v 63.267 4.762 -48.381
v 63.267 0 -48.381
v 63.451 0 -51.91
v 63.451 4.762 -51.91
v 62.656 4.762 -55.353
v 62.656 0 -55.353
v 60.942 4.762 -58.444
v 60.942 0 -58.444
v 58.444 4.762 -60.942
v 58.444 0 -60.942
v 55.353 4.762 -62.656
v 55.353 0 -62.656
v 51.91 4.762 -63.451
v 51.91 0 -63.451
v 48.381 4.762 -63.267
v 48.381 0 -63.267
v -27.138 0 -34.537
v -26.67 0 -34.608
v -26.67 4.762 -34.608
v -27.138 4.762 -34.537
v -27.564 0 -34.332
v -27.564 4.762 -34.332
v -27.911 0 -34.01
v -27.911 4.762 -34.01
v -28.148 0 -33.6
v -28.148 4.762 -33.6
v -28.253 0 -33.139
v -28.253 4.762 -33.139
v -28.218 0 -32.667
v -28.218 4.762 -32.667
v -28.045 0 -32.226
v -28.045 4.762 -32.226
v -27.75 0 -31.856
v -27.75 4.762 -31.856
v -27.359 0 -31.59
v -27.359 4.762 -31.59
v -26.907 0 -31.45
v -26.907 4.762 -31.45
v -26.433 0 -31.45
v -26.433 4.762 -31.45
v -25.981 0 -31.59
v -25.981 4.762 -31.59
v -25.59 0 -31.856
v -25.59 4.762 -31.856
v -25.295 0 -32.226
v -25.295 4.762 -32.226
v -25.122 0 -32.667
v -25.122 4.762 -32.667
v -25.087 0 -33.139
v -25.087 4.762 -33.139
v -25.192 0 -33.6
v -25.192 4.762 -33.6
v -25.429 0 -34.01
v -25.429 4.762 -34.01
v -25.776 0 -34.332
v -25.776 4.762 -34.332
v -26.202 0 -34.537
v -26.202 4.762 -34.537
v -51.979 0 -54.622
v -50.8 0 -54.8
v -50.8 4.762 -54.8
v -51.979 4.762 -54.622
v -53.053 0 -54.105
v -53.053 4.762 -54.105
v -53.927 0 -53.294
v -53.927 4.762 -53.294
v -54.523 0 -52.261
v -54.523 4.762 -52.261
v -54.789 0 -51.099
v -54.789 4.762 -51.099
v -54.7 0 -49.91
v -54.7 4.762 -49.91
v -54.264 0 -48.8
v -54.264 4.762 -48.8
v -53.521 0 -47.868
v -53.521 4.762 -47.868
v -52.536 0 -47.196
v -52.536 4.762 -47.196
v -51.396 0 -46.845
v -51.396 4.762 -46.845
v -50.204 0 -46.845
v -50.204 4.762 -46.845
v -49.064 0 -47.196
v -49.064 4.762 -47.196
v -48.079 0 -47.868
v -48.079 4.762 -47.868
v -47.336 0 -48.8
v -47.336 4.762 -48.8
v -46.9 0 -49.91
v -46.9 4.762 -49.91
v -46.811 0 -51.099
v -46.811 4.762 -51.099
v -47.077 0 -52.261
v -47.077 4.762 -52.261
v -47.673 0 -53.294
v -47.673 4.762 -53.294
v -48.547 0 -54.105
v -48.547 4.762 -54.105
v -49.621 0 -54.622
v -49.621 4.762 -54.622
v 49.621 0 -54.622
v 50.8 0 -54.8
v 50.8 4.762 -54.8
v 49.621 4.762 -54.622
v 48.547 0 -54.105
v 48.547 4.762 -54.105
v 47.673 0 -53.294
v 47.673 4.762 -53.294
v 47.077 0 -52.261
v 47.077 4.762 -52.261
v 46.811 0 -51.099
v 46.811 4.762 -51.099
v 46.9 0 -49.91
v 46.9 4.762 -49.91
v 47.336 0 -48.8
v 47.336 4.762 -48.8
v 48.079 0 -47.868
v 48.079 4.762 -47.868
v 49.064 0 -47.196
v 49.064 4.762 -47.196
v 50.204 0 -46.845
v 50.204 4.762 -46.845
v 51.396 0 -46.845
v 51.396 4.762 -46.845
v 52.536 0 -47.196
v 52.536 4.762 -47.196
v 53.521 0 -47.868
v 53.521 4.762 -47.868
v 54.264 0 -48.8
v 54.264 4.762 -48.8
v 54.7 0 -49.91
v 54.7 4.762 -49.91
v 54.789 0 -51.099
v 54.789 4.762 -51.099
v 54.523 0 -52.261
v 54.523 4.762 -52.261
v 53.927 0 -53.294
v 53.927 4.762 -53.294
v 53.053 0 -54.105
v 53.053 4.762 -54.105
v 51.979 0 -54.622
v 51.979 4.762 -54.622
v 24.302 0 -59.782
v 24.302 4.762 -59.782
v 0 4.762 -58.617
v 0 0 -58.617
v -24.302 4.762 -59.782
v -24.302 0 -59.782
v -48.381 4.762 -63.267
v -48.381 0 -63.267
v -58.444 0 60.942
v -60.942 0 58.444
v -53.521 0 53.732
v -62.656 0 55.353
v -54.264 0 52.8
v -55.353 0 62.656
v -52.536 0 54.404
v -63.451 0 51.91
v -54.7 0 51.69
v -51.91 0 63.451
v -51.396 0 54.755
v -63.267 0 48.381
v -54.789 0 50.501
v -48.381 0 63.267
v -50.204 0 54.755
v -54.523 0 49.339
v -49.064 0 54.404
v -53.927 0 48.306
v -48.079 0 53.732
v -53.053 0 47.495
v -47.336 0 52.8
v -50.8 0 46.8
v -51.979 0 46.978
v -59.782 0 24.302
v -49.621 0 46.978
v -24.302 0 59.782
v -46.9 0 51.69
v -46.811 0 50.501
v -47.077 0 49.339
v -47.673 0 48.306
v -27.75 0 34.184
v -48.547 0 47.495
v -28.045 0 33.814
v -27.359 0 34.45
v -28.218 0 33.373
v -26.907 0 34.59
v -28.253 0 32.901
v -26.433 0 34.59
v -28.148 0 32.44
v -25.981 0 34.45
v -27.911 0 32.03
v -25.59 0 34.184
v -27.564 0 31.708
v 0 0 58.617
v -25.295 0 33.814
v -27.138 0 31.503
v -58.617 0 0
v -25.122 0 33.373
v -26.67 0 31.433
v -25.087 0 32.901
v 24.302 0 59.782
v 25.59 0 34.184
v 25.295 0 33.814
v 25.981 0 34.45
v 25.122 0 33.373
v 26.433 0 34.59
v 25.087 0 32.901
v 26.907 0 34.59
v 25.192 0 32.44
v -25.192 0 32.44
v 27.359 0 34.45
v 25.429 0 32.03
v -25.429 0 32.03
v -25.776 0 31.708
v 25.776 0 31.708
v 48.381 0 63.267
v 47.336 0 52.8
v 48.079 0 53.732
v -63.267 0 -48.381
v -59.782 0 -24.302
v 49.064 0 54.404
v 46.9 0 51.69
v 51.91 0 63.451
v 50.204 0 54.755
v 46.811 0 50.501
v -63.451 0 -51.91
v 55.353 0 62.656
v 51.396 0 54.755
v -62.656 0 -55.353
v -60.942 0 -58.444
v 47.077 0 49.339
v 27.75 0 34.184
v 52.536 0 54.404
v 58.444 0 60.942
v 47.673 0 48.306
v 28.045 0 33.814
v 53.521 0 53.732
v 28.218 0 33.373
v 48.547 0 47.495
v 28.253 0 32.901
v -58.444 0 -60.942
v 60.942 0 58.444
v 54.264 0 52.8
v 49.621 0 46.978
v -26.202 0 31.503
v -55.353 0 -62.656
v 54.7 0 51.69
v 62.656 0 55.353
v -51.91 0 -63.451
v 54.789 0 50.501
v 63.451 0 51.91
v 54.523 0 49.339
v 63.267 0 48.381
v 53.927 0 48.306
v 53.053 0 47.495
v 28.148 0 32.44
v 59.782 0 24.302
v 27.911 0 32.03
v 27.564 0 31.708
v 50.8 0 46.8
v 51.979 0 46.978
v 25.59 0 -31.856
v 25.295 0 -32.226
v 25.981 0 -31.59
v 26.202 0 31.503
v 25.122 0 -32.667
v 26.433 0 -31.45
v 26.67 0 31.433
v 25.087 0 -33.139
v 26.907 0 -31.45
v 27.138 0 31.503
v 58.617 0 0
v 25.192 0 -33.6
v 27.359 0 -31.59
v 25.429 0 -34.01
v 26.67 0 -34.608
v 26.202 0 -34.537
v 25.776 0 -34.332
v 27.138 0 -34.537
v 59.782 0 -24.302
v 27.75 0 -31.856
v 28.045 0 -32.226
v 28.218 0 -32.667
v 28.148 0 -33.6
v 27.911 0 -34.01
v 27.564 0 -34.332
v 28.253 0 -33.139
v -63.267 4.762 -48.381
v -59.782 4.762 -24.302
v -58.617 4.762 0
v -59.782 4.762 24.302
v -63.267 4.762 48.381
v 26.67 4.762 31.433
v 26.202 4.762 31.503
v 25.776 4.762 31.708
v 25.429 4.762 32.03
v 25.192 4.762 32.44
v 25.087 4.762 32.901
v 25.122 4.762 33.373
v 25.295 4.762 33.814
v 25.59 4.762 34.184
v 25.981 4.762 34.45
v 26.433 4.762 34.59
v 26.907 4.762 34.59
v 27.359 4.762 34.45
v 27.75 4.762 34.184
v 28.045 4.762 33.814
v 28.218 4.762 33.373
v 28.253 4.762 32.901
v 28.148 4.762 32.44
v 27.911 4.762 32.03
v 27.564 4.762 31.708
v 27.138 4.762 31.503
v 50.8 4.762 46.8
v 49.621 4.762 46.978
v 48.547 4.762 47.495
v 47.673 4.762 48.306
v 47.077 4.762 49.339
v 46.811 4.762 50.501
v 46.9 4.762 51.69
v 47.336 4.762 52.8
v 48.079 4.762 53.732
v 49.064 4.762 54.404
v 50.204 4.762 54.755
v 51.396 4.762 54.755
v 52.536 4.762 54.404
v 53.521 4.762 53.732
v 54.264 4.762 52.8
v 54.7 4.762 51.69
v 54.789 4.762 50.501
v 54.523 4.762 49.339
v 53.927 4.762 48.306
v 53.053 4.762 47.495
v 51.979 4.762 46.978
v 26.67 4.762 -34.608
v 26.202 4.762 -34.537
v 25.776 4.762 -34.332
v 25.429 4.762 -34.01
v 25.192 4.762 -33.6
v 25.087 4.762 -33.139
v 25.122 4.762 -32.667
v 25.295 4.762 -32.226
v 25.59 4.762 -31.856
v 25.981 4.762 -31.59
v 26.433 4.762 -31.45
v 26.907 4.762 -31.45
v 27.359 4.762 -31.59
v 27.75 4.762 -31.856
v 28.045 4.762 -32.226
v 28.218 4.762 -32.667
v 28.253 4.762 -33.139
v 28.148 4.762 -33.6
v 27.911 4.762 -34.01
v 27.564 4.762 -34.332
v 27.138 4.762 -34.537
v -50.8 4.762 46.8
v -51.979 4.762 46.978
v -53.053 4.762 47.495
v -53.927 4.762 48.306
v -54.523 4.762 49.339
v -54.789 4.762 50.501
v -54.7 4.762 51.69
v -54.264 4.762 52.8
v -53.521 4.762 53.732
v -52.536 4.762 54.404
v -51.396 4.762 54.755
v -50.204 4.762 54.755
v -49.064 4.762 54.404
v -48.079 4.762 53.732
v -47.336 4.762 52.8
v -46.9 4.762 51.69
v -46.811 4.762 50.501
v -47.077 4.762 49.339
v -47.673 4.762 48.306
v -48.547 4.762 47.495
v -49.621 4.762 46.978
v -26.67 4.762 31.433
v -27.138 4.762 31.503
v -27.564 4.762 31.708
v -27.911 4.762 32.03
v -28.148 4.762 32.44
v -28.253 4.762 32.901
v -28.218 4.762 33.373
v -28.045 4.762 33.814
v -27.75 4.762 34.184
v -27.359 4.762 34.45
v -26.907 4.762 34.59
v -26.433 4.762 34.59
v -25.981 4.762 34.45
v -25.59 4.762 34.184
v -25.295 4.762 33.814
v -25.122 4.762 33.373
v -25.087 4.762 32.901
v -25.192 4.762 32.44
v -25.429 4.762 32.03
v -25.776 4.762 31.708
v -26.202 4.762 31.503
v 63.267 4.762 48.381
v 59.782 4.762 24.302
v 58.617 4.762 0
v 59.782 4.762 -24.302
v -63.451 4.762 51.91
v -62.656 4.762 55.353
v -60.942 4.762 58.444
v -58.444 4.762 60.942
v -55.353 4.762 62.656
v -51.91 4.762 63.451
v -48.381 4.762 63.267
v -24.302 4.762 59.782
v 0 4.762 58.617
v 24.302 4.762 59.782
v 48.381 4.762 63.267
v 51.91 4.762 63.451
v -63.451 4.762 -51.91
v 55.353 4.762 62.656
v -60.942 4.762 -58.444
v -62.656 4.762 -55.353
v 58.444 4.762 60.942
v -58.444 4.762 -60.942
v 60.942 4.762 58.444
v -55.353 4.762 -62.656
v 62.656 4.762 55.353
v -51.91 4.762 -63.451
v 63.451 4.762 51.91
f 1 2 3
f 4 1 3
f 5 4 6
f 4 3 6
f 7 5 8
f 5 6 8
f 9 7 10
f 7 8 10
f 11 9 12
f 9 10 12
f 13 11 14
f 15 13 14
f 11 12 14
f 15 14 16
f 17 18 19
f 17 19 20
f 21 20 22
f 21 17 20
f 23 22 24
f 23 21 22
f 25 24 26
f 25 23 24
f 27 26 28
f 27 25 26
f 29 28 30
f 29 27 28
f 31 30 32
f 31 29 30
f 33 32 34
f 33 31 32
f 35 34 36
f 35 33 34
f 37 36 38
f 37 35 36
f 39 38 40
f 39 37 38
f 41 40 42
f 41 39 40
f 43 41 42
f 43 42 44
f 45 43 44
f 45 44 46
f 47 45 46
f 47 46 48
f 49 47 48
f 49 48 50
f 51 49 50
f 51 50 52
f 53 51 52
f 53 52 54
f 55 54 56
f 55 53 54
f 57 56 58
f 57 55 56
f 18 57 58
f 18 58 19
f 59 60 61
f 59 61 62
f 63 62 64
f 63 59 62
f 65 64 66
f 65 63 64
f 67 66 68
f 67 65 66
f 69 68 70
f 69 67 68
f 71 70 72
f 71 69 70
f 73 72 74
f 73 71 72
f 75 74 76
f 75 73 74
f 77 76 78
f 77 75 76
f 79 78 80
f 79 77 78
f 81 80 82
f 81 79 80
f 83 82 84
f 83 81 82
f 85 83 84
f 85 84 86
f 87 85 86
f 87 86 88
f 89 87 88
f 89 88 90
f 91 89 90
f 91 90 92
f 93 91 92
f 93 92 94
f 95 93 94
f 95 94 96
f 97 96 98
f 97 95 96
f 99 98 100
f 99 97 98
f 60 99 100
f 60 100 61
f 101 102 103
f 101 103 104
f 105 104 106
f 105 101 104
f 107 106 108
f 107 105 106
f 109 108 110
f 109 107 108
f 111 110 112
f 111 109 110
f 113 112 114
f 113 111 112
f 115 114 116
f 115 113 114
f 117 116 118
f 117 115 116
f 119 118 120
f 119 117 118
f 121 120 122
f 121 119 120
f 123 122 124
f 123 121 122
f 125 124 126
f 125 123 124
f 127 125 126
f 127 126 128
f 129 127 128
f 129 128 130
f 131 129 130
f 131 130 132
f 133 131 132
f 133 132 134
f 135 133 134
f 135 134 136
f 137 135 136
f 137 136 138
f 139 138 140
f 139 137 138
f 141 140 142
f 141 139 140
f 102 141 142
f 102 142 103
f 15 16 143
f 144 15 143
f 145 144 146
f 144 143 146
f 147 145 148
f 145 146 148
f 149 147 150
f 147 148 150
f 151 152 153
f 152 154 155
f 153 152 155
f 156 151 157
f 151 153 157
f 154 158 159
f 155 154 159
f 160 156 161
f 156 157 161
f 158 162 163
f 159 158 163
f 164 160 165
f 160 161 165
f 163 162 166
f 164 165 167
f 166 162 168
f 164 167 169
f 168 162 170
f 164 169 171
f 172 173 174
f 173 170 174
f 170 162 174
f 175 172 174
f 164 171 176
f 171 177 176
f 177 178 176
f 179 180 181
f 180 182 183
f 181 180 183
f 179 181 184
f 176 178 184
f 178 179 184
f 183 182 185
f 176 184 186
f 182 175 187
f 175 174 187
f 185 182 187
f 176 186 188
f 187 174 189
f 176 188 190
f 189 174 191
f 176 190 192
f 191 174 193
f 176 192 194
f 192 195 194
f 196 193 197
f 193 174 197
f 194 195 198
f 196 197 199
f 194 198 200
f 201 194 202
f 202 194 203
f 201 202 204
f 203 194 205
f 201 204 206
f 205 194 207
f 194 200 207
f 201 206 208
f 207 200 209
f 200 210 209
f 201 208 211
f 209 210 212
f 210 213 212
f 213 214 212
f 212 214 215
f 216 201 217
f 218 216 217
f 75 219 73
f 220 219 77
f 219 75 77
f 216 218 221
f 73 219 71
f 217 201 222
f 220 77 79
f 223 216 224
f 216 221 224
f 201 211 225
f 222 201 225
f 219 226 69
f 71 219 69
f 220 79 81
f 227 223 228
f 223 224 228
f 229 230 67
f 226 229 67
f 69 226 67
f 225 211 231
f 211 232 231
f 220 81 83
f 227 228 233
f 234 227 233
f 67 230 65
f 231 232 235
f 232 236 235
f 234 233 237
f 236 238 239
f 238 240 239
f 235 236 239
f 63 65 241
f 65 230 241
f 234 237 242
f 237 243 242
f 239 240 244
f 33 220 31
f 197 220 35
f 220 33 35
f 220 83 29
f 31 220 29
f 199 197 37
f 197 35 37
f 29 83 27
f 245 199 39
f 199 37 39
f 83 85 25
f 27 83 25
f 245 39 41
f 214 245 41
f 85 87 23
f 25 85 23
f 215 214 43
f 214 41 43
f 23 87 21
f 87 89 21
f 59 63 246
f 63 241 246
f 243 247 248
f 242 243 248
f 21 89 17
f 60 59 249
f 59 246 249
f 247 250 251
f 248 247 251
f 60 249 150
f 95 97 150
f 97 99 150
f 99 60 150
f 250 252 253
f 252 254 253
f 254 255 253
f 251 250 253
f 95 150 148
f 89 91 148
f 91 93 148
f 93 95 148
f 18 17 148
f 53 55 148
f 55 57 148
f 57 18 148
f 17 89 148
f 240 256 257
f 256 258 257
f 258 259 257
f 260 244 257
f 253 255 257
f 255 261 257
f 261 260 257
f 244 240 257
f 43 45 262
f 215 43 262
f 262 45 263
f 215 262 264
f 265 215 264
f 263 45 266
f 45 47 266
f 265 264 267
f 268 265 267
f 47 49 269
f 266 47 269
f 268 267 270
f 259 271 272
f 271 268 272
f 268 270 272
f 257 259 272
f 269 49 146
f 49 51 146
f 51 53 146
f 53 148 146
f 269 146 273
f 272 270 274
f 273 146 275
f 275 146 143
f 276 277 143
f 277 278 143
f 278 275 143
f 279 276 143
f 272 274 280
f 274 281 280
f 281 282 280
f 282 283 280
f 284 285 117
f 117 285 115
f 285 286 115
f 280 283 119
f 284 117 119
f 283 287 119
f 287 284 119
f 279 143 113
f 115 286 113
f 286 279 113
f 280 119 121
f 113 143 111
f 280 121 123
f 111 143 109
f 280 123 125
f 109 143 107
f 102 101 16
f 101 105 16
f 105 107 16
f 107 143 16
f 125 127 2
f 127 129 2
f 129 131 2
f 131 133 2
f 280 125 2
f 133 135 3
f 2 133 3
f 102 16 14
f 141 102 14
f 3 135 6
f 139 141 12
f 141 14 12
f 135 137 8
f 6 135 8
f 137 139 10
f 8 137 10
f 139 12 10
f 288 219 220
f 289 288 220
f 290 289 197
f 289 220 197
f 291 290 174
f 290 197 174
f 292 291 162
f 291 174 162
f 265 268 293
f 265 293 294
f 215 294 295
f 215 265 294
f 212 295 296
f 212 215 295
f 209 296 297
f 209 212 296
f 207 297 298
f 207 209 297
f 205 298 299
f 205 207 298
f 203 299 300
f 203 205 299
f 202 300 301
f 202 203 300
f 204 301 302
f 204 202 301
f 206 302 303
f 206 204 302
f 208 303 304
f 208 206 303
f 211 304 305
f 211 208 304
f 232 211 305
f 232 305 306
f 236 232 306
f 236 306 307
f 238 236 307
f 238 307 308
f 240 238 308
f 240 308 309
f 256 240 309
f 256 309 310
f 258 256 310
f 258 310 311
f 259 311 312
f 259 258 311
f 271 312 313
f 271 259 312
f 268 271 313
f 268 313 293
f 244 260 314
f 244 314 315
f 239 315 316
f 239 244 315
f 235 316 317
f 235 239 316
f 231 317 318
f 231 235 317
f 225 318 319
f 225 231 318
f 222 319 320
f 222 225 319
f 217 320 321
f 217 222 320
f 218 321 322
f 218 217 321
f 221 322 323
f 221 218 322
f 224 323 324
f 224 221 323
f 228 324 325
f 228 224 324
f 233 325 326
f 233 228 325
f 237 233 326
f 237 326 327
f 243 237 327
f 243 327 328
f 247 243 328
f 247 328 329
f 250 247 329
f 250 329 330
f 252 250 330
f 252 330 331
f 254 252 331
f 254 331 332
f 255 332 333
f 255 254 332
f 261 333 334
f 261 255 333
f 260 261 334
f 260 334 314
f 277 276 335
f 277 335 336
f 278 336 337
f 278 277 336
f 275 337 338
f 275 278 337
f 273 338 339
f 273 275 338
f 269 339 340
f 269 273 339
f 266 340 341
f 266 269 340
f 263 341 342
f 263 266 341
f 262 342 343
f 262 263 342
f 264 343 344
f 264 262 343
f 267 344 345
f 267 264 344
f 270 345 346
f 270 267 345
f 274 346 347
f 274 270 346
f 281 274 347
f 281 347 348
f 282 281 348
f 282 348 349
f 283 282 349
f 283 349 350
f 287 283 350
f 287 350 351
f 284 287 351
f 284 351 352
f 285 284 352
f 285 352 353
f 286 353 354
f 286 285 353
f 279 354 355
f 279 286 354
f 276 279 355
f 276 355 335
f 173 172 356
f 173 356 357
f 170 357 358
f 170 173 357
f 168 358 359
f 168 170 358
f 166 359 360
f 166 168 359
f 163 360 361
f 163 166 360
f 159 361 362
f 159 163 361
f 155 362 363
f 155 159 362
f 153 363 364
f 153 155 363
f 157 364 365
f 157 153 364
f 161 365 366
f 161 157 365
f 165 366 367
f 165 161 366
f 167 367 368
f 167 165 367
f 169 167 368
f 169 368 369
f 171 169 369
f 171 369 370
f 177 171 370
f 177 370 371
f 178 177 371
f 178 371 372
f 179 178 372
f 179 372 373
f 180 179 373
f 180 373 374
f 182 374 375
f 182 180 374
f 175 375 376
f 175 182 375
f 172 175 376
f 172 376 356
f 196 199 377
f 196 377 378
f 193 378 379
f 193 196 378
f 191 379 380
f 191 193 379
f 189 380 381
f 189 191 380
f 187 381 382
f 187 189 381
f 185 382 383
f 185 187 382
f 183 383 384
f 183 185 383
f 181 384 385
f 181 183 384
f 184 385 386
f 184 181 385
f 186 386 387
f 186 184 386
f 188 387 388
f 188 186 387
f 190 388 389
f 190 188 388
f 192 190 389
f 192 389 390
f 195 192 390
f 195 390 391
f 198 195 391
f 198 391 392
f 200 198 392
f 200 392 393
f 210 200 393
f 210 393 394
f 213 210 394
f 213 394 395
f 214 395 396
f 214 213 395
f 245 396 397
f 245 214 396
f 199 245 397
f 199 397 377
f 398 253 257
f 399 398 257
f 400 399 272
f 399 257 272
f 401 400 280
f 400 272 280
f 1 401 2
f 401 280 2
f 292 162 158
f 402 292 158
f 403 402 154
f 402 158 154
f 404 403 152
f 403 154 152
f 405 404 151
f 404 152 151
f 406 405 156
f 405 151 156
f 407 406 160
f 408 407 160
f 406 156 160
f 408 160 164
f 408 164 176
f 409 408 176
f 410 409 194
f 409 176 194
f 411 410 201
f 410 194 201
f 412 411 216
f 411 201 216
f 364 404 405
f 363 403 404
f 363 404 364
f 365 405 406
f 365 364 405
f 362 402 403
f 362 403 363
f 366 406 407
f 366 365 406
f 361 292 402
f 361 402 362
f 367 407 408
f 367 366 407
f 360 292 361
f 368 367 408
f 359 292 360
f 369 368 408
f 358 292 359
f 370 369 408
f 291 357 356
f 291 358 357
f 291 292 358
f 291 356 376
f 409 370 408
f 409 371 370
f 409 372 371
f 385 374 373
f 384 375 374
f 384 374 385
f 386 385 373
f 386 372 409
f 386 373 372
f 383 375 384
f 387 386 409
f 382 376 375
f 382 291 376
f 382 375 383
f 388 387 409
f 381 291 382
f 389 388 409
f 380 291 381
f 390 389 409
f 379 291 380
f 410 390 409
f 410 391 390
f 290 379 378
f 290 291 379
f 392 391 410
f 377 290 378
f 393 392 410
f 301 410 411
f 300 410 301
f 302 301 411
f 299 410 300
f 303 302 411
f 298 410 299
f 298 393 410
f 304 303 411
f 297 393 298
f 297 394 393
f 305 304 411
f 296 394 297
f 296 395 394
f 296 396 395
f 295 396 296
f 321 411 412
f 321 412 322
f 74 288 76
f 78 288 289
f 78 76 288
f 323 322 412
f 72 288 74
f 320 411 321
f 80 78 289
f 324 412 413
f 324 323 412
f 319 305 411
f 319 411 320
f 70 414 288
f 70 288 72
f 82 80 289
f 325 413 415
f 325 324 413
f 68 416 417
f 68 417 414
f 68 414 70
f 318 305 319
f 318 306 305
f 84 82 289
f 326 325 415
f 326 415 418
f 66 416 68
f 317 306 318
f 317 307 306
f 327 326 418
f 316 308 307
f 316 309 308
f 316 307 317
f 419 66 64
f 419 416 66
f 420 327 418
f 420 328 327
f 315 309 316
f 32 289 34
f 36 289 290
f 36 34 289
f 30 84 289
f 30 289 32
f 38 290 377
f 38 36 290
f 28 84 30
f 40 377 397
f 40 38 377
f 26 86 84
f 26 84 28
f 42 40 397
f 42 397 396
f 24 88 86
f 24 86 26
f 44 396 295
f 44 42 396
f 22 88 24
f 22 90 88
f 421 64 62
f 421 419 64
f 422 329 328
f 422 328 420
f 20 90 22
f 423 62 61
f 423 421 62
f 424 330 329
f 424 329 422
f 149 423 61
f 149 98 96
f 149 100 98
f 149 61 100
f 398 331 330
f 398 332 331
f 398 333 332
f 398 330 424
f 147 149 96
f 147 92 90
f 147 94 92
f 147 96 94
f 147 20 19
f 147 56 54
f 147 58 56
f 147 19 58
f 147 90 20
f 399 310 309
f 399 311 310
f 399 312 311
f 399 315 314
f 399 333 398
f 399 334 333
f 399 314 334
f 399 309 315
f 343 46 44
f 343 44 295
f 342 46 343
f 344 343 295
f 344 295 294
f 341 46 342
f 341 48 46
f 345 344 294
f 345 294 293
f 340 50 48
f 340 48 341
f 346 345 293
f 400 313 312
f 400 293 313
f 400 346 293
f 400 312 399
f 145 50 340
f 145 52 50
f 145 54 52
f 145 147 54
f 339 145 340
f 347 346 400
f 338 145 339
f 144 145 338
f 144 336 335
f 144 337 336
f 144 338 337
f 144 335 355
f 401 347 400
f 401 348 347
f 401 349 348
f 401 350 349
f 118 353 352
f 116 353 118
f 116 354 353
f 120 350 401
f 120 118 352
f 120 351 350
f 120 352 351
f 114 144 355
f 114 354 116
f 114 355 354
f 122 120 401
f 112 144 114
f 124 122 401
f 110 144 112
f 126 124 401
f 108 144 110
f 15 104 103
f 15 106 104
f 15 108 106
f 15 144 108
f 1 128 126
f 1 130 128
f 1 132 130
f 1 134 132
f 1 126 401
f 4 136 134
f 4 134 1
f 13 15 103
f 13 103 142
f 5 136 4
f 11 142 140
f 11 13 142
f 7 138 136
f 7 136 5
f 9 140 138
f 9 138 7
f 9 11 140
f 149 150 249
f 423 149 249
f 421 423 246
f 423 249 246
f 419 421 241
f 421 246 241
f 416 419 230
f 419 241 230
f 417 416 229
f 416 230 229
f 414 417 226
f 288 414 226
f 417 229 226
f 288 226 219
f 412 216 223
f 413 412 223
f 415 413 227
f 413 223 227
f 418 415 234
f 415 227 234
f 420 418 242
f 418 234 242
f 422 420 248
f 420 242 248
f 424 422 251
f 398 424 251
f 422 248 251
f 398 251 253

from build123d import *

# Parameters (mm, degrees)
SKETCH1_R           = 4
SKETCH1_R_2         = 1.5875
BOSS_EXTRUDE1_DEPTH = 4.7625


with BuildPart() as part:
    # Sketch1 → Boss-Extrude1 (new body)
    with BuildSketch(Plane(origin=(0, 0, 0), x_dir=(1, 0, 0), z_dir=(0, 1, 0))):
        with BuildLine():
            ThreePointArc((-48.380952381, 63.267486058), (-59.780256121, 59.780256121), (-63.267486058, 48.380952381))
            ThreePointArc((-63.267486058, 48.380952381), (-58.617207227, 0), (-63.267486058, -48.380952381))
            ThreePointArc((-63.267486058, -48.380952381), (-59.780256121, -59.780256121), (-48.380952381, -63.267486058))
            ThreePointArc((-48.380952381, -63.267486058), (0, -58.617207227), (48.380952381, -63.267486058))
            ThreePointArc((48.380952381, -63.267486058), (59.780256121, -59.780256121), (63.267486058, -48.380952381))
            ThreePointArc((63.267486058, -48.380952381), (58.617207227, 0), (63.267486058, 48.380952381))
            ThreePointArc((63.267486058, 48.380952381), (59.780256121, 59.780256121), (48.380952381, 63.267486058))
            ThreePointArc((48.380952381, 63.267486058), (0, 58.617207227), (-48.380952381, 63.267486058))
        make_face()
        with Locations(Location((-50.8, 50.8, 0), (0, 0, 90))):
            Circle(SKETCH1_R, mode=Mode.SUBTRACT)
        with Locations(Location((50.8, 50.8, 0), (0, 0, 90))):
            Circle(SKETCH1_R, mode=Mode.SUBTRACT)
        with Locations(Location((50.8, -50.8, 0), (0, 0, 90))):
            Circle(SKETCH1_R, mode=Mode.SUBTRACT)
        with Locations(Location((-50.8, -50.8, 0), (0, 0, 90))):
            Circle(SKETCH1_R, mode=Mode.SUBTRACT)
        with Locations(Location((-26.67, 33.02, 0), (0, 0, 90))):
            Circle(SKETCH1_R_2, mode=Mode.SUBTRACT)
        with Locations(Location((26.67, 33.02, 0), (0, 0, 90))):
            Circle(SKETCH1_R_2, mode=Mode.SUBTRACT)
        with Locations(Location((-26.67, -33.02, 0), (0, 0, 90))):
            Circle(SKETCH1_R_2, mode=Mode.SUBTRACT)
        with Locations(Location((26.67, -33.02, 0), (0, 0, 90))):
            Circle(SKETCH1_R_2, mode=Mode.SUBTRACT)
    extrude(amount=BOSS_EXTRUDE1_DEPTH)


solid = part.part
